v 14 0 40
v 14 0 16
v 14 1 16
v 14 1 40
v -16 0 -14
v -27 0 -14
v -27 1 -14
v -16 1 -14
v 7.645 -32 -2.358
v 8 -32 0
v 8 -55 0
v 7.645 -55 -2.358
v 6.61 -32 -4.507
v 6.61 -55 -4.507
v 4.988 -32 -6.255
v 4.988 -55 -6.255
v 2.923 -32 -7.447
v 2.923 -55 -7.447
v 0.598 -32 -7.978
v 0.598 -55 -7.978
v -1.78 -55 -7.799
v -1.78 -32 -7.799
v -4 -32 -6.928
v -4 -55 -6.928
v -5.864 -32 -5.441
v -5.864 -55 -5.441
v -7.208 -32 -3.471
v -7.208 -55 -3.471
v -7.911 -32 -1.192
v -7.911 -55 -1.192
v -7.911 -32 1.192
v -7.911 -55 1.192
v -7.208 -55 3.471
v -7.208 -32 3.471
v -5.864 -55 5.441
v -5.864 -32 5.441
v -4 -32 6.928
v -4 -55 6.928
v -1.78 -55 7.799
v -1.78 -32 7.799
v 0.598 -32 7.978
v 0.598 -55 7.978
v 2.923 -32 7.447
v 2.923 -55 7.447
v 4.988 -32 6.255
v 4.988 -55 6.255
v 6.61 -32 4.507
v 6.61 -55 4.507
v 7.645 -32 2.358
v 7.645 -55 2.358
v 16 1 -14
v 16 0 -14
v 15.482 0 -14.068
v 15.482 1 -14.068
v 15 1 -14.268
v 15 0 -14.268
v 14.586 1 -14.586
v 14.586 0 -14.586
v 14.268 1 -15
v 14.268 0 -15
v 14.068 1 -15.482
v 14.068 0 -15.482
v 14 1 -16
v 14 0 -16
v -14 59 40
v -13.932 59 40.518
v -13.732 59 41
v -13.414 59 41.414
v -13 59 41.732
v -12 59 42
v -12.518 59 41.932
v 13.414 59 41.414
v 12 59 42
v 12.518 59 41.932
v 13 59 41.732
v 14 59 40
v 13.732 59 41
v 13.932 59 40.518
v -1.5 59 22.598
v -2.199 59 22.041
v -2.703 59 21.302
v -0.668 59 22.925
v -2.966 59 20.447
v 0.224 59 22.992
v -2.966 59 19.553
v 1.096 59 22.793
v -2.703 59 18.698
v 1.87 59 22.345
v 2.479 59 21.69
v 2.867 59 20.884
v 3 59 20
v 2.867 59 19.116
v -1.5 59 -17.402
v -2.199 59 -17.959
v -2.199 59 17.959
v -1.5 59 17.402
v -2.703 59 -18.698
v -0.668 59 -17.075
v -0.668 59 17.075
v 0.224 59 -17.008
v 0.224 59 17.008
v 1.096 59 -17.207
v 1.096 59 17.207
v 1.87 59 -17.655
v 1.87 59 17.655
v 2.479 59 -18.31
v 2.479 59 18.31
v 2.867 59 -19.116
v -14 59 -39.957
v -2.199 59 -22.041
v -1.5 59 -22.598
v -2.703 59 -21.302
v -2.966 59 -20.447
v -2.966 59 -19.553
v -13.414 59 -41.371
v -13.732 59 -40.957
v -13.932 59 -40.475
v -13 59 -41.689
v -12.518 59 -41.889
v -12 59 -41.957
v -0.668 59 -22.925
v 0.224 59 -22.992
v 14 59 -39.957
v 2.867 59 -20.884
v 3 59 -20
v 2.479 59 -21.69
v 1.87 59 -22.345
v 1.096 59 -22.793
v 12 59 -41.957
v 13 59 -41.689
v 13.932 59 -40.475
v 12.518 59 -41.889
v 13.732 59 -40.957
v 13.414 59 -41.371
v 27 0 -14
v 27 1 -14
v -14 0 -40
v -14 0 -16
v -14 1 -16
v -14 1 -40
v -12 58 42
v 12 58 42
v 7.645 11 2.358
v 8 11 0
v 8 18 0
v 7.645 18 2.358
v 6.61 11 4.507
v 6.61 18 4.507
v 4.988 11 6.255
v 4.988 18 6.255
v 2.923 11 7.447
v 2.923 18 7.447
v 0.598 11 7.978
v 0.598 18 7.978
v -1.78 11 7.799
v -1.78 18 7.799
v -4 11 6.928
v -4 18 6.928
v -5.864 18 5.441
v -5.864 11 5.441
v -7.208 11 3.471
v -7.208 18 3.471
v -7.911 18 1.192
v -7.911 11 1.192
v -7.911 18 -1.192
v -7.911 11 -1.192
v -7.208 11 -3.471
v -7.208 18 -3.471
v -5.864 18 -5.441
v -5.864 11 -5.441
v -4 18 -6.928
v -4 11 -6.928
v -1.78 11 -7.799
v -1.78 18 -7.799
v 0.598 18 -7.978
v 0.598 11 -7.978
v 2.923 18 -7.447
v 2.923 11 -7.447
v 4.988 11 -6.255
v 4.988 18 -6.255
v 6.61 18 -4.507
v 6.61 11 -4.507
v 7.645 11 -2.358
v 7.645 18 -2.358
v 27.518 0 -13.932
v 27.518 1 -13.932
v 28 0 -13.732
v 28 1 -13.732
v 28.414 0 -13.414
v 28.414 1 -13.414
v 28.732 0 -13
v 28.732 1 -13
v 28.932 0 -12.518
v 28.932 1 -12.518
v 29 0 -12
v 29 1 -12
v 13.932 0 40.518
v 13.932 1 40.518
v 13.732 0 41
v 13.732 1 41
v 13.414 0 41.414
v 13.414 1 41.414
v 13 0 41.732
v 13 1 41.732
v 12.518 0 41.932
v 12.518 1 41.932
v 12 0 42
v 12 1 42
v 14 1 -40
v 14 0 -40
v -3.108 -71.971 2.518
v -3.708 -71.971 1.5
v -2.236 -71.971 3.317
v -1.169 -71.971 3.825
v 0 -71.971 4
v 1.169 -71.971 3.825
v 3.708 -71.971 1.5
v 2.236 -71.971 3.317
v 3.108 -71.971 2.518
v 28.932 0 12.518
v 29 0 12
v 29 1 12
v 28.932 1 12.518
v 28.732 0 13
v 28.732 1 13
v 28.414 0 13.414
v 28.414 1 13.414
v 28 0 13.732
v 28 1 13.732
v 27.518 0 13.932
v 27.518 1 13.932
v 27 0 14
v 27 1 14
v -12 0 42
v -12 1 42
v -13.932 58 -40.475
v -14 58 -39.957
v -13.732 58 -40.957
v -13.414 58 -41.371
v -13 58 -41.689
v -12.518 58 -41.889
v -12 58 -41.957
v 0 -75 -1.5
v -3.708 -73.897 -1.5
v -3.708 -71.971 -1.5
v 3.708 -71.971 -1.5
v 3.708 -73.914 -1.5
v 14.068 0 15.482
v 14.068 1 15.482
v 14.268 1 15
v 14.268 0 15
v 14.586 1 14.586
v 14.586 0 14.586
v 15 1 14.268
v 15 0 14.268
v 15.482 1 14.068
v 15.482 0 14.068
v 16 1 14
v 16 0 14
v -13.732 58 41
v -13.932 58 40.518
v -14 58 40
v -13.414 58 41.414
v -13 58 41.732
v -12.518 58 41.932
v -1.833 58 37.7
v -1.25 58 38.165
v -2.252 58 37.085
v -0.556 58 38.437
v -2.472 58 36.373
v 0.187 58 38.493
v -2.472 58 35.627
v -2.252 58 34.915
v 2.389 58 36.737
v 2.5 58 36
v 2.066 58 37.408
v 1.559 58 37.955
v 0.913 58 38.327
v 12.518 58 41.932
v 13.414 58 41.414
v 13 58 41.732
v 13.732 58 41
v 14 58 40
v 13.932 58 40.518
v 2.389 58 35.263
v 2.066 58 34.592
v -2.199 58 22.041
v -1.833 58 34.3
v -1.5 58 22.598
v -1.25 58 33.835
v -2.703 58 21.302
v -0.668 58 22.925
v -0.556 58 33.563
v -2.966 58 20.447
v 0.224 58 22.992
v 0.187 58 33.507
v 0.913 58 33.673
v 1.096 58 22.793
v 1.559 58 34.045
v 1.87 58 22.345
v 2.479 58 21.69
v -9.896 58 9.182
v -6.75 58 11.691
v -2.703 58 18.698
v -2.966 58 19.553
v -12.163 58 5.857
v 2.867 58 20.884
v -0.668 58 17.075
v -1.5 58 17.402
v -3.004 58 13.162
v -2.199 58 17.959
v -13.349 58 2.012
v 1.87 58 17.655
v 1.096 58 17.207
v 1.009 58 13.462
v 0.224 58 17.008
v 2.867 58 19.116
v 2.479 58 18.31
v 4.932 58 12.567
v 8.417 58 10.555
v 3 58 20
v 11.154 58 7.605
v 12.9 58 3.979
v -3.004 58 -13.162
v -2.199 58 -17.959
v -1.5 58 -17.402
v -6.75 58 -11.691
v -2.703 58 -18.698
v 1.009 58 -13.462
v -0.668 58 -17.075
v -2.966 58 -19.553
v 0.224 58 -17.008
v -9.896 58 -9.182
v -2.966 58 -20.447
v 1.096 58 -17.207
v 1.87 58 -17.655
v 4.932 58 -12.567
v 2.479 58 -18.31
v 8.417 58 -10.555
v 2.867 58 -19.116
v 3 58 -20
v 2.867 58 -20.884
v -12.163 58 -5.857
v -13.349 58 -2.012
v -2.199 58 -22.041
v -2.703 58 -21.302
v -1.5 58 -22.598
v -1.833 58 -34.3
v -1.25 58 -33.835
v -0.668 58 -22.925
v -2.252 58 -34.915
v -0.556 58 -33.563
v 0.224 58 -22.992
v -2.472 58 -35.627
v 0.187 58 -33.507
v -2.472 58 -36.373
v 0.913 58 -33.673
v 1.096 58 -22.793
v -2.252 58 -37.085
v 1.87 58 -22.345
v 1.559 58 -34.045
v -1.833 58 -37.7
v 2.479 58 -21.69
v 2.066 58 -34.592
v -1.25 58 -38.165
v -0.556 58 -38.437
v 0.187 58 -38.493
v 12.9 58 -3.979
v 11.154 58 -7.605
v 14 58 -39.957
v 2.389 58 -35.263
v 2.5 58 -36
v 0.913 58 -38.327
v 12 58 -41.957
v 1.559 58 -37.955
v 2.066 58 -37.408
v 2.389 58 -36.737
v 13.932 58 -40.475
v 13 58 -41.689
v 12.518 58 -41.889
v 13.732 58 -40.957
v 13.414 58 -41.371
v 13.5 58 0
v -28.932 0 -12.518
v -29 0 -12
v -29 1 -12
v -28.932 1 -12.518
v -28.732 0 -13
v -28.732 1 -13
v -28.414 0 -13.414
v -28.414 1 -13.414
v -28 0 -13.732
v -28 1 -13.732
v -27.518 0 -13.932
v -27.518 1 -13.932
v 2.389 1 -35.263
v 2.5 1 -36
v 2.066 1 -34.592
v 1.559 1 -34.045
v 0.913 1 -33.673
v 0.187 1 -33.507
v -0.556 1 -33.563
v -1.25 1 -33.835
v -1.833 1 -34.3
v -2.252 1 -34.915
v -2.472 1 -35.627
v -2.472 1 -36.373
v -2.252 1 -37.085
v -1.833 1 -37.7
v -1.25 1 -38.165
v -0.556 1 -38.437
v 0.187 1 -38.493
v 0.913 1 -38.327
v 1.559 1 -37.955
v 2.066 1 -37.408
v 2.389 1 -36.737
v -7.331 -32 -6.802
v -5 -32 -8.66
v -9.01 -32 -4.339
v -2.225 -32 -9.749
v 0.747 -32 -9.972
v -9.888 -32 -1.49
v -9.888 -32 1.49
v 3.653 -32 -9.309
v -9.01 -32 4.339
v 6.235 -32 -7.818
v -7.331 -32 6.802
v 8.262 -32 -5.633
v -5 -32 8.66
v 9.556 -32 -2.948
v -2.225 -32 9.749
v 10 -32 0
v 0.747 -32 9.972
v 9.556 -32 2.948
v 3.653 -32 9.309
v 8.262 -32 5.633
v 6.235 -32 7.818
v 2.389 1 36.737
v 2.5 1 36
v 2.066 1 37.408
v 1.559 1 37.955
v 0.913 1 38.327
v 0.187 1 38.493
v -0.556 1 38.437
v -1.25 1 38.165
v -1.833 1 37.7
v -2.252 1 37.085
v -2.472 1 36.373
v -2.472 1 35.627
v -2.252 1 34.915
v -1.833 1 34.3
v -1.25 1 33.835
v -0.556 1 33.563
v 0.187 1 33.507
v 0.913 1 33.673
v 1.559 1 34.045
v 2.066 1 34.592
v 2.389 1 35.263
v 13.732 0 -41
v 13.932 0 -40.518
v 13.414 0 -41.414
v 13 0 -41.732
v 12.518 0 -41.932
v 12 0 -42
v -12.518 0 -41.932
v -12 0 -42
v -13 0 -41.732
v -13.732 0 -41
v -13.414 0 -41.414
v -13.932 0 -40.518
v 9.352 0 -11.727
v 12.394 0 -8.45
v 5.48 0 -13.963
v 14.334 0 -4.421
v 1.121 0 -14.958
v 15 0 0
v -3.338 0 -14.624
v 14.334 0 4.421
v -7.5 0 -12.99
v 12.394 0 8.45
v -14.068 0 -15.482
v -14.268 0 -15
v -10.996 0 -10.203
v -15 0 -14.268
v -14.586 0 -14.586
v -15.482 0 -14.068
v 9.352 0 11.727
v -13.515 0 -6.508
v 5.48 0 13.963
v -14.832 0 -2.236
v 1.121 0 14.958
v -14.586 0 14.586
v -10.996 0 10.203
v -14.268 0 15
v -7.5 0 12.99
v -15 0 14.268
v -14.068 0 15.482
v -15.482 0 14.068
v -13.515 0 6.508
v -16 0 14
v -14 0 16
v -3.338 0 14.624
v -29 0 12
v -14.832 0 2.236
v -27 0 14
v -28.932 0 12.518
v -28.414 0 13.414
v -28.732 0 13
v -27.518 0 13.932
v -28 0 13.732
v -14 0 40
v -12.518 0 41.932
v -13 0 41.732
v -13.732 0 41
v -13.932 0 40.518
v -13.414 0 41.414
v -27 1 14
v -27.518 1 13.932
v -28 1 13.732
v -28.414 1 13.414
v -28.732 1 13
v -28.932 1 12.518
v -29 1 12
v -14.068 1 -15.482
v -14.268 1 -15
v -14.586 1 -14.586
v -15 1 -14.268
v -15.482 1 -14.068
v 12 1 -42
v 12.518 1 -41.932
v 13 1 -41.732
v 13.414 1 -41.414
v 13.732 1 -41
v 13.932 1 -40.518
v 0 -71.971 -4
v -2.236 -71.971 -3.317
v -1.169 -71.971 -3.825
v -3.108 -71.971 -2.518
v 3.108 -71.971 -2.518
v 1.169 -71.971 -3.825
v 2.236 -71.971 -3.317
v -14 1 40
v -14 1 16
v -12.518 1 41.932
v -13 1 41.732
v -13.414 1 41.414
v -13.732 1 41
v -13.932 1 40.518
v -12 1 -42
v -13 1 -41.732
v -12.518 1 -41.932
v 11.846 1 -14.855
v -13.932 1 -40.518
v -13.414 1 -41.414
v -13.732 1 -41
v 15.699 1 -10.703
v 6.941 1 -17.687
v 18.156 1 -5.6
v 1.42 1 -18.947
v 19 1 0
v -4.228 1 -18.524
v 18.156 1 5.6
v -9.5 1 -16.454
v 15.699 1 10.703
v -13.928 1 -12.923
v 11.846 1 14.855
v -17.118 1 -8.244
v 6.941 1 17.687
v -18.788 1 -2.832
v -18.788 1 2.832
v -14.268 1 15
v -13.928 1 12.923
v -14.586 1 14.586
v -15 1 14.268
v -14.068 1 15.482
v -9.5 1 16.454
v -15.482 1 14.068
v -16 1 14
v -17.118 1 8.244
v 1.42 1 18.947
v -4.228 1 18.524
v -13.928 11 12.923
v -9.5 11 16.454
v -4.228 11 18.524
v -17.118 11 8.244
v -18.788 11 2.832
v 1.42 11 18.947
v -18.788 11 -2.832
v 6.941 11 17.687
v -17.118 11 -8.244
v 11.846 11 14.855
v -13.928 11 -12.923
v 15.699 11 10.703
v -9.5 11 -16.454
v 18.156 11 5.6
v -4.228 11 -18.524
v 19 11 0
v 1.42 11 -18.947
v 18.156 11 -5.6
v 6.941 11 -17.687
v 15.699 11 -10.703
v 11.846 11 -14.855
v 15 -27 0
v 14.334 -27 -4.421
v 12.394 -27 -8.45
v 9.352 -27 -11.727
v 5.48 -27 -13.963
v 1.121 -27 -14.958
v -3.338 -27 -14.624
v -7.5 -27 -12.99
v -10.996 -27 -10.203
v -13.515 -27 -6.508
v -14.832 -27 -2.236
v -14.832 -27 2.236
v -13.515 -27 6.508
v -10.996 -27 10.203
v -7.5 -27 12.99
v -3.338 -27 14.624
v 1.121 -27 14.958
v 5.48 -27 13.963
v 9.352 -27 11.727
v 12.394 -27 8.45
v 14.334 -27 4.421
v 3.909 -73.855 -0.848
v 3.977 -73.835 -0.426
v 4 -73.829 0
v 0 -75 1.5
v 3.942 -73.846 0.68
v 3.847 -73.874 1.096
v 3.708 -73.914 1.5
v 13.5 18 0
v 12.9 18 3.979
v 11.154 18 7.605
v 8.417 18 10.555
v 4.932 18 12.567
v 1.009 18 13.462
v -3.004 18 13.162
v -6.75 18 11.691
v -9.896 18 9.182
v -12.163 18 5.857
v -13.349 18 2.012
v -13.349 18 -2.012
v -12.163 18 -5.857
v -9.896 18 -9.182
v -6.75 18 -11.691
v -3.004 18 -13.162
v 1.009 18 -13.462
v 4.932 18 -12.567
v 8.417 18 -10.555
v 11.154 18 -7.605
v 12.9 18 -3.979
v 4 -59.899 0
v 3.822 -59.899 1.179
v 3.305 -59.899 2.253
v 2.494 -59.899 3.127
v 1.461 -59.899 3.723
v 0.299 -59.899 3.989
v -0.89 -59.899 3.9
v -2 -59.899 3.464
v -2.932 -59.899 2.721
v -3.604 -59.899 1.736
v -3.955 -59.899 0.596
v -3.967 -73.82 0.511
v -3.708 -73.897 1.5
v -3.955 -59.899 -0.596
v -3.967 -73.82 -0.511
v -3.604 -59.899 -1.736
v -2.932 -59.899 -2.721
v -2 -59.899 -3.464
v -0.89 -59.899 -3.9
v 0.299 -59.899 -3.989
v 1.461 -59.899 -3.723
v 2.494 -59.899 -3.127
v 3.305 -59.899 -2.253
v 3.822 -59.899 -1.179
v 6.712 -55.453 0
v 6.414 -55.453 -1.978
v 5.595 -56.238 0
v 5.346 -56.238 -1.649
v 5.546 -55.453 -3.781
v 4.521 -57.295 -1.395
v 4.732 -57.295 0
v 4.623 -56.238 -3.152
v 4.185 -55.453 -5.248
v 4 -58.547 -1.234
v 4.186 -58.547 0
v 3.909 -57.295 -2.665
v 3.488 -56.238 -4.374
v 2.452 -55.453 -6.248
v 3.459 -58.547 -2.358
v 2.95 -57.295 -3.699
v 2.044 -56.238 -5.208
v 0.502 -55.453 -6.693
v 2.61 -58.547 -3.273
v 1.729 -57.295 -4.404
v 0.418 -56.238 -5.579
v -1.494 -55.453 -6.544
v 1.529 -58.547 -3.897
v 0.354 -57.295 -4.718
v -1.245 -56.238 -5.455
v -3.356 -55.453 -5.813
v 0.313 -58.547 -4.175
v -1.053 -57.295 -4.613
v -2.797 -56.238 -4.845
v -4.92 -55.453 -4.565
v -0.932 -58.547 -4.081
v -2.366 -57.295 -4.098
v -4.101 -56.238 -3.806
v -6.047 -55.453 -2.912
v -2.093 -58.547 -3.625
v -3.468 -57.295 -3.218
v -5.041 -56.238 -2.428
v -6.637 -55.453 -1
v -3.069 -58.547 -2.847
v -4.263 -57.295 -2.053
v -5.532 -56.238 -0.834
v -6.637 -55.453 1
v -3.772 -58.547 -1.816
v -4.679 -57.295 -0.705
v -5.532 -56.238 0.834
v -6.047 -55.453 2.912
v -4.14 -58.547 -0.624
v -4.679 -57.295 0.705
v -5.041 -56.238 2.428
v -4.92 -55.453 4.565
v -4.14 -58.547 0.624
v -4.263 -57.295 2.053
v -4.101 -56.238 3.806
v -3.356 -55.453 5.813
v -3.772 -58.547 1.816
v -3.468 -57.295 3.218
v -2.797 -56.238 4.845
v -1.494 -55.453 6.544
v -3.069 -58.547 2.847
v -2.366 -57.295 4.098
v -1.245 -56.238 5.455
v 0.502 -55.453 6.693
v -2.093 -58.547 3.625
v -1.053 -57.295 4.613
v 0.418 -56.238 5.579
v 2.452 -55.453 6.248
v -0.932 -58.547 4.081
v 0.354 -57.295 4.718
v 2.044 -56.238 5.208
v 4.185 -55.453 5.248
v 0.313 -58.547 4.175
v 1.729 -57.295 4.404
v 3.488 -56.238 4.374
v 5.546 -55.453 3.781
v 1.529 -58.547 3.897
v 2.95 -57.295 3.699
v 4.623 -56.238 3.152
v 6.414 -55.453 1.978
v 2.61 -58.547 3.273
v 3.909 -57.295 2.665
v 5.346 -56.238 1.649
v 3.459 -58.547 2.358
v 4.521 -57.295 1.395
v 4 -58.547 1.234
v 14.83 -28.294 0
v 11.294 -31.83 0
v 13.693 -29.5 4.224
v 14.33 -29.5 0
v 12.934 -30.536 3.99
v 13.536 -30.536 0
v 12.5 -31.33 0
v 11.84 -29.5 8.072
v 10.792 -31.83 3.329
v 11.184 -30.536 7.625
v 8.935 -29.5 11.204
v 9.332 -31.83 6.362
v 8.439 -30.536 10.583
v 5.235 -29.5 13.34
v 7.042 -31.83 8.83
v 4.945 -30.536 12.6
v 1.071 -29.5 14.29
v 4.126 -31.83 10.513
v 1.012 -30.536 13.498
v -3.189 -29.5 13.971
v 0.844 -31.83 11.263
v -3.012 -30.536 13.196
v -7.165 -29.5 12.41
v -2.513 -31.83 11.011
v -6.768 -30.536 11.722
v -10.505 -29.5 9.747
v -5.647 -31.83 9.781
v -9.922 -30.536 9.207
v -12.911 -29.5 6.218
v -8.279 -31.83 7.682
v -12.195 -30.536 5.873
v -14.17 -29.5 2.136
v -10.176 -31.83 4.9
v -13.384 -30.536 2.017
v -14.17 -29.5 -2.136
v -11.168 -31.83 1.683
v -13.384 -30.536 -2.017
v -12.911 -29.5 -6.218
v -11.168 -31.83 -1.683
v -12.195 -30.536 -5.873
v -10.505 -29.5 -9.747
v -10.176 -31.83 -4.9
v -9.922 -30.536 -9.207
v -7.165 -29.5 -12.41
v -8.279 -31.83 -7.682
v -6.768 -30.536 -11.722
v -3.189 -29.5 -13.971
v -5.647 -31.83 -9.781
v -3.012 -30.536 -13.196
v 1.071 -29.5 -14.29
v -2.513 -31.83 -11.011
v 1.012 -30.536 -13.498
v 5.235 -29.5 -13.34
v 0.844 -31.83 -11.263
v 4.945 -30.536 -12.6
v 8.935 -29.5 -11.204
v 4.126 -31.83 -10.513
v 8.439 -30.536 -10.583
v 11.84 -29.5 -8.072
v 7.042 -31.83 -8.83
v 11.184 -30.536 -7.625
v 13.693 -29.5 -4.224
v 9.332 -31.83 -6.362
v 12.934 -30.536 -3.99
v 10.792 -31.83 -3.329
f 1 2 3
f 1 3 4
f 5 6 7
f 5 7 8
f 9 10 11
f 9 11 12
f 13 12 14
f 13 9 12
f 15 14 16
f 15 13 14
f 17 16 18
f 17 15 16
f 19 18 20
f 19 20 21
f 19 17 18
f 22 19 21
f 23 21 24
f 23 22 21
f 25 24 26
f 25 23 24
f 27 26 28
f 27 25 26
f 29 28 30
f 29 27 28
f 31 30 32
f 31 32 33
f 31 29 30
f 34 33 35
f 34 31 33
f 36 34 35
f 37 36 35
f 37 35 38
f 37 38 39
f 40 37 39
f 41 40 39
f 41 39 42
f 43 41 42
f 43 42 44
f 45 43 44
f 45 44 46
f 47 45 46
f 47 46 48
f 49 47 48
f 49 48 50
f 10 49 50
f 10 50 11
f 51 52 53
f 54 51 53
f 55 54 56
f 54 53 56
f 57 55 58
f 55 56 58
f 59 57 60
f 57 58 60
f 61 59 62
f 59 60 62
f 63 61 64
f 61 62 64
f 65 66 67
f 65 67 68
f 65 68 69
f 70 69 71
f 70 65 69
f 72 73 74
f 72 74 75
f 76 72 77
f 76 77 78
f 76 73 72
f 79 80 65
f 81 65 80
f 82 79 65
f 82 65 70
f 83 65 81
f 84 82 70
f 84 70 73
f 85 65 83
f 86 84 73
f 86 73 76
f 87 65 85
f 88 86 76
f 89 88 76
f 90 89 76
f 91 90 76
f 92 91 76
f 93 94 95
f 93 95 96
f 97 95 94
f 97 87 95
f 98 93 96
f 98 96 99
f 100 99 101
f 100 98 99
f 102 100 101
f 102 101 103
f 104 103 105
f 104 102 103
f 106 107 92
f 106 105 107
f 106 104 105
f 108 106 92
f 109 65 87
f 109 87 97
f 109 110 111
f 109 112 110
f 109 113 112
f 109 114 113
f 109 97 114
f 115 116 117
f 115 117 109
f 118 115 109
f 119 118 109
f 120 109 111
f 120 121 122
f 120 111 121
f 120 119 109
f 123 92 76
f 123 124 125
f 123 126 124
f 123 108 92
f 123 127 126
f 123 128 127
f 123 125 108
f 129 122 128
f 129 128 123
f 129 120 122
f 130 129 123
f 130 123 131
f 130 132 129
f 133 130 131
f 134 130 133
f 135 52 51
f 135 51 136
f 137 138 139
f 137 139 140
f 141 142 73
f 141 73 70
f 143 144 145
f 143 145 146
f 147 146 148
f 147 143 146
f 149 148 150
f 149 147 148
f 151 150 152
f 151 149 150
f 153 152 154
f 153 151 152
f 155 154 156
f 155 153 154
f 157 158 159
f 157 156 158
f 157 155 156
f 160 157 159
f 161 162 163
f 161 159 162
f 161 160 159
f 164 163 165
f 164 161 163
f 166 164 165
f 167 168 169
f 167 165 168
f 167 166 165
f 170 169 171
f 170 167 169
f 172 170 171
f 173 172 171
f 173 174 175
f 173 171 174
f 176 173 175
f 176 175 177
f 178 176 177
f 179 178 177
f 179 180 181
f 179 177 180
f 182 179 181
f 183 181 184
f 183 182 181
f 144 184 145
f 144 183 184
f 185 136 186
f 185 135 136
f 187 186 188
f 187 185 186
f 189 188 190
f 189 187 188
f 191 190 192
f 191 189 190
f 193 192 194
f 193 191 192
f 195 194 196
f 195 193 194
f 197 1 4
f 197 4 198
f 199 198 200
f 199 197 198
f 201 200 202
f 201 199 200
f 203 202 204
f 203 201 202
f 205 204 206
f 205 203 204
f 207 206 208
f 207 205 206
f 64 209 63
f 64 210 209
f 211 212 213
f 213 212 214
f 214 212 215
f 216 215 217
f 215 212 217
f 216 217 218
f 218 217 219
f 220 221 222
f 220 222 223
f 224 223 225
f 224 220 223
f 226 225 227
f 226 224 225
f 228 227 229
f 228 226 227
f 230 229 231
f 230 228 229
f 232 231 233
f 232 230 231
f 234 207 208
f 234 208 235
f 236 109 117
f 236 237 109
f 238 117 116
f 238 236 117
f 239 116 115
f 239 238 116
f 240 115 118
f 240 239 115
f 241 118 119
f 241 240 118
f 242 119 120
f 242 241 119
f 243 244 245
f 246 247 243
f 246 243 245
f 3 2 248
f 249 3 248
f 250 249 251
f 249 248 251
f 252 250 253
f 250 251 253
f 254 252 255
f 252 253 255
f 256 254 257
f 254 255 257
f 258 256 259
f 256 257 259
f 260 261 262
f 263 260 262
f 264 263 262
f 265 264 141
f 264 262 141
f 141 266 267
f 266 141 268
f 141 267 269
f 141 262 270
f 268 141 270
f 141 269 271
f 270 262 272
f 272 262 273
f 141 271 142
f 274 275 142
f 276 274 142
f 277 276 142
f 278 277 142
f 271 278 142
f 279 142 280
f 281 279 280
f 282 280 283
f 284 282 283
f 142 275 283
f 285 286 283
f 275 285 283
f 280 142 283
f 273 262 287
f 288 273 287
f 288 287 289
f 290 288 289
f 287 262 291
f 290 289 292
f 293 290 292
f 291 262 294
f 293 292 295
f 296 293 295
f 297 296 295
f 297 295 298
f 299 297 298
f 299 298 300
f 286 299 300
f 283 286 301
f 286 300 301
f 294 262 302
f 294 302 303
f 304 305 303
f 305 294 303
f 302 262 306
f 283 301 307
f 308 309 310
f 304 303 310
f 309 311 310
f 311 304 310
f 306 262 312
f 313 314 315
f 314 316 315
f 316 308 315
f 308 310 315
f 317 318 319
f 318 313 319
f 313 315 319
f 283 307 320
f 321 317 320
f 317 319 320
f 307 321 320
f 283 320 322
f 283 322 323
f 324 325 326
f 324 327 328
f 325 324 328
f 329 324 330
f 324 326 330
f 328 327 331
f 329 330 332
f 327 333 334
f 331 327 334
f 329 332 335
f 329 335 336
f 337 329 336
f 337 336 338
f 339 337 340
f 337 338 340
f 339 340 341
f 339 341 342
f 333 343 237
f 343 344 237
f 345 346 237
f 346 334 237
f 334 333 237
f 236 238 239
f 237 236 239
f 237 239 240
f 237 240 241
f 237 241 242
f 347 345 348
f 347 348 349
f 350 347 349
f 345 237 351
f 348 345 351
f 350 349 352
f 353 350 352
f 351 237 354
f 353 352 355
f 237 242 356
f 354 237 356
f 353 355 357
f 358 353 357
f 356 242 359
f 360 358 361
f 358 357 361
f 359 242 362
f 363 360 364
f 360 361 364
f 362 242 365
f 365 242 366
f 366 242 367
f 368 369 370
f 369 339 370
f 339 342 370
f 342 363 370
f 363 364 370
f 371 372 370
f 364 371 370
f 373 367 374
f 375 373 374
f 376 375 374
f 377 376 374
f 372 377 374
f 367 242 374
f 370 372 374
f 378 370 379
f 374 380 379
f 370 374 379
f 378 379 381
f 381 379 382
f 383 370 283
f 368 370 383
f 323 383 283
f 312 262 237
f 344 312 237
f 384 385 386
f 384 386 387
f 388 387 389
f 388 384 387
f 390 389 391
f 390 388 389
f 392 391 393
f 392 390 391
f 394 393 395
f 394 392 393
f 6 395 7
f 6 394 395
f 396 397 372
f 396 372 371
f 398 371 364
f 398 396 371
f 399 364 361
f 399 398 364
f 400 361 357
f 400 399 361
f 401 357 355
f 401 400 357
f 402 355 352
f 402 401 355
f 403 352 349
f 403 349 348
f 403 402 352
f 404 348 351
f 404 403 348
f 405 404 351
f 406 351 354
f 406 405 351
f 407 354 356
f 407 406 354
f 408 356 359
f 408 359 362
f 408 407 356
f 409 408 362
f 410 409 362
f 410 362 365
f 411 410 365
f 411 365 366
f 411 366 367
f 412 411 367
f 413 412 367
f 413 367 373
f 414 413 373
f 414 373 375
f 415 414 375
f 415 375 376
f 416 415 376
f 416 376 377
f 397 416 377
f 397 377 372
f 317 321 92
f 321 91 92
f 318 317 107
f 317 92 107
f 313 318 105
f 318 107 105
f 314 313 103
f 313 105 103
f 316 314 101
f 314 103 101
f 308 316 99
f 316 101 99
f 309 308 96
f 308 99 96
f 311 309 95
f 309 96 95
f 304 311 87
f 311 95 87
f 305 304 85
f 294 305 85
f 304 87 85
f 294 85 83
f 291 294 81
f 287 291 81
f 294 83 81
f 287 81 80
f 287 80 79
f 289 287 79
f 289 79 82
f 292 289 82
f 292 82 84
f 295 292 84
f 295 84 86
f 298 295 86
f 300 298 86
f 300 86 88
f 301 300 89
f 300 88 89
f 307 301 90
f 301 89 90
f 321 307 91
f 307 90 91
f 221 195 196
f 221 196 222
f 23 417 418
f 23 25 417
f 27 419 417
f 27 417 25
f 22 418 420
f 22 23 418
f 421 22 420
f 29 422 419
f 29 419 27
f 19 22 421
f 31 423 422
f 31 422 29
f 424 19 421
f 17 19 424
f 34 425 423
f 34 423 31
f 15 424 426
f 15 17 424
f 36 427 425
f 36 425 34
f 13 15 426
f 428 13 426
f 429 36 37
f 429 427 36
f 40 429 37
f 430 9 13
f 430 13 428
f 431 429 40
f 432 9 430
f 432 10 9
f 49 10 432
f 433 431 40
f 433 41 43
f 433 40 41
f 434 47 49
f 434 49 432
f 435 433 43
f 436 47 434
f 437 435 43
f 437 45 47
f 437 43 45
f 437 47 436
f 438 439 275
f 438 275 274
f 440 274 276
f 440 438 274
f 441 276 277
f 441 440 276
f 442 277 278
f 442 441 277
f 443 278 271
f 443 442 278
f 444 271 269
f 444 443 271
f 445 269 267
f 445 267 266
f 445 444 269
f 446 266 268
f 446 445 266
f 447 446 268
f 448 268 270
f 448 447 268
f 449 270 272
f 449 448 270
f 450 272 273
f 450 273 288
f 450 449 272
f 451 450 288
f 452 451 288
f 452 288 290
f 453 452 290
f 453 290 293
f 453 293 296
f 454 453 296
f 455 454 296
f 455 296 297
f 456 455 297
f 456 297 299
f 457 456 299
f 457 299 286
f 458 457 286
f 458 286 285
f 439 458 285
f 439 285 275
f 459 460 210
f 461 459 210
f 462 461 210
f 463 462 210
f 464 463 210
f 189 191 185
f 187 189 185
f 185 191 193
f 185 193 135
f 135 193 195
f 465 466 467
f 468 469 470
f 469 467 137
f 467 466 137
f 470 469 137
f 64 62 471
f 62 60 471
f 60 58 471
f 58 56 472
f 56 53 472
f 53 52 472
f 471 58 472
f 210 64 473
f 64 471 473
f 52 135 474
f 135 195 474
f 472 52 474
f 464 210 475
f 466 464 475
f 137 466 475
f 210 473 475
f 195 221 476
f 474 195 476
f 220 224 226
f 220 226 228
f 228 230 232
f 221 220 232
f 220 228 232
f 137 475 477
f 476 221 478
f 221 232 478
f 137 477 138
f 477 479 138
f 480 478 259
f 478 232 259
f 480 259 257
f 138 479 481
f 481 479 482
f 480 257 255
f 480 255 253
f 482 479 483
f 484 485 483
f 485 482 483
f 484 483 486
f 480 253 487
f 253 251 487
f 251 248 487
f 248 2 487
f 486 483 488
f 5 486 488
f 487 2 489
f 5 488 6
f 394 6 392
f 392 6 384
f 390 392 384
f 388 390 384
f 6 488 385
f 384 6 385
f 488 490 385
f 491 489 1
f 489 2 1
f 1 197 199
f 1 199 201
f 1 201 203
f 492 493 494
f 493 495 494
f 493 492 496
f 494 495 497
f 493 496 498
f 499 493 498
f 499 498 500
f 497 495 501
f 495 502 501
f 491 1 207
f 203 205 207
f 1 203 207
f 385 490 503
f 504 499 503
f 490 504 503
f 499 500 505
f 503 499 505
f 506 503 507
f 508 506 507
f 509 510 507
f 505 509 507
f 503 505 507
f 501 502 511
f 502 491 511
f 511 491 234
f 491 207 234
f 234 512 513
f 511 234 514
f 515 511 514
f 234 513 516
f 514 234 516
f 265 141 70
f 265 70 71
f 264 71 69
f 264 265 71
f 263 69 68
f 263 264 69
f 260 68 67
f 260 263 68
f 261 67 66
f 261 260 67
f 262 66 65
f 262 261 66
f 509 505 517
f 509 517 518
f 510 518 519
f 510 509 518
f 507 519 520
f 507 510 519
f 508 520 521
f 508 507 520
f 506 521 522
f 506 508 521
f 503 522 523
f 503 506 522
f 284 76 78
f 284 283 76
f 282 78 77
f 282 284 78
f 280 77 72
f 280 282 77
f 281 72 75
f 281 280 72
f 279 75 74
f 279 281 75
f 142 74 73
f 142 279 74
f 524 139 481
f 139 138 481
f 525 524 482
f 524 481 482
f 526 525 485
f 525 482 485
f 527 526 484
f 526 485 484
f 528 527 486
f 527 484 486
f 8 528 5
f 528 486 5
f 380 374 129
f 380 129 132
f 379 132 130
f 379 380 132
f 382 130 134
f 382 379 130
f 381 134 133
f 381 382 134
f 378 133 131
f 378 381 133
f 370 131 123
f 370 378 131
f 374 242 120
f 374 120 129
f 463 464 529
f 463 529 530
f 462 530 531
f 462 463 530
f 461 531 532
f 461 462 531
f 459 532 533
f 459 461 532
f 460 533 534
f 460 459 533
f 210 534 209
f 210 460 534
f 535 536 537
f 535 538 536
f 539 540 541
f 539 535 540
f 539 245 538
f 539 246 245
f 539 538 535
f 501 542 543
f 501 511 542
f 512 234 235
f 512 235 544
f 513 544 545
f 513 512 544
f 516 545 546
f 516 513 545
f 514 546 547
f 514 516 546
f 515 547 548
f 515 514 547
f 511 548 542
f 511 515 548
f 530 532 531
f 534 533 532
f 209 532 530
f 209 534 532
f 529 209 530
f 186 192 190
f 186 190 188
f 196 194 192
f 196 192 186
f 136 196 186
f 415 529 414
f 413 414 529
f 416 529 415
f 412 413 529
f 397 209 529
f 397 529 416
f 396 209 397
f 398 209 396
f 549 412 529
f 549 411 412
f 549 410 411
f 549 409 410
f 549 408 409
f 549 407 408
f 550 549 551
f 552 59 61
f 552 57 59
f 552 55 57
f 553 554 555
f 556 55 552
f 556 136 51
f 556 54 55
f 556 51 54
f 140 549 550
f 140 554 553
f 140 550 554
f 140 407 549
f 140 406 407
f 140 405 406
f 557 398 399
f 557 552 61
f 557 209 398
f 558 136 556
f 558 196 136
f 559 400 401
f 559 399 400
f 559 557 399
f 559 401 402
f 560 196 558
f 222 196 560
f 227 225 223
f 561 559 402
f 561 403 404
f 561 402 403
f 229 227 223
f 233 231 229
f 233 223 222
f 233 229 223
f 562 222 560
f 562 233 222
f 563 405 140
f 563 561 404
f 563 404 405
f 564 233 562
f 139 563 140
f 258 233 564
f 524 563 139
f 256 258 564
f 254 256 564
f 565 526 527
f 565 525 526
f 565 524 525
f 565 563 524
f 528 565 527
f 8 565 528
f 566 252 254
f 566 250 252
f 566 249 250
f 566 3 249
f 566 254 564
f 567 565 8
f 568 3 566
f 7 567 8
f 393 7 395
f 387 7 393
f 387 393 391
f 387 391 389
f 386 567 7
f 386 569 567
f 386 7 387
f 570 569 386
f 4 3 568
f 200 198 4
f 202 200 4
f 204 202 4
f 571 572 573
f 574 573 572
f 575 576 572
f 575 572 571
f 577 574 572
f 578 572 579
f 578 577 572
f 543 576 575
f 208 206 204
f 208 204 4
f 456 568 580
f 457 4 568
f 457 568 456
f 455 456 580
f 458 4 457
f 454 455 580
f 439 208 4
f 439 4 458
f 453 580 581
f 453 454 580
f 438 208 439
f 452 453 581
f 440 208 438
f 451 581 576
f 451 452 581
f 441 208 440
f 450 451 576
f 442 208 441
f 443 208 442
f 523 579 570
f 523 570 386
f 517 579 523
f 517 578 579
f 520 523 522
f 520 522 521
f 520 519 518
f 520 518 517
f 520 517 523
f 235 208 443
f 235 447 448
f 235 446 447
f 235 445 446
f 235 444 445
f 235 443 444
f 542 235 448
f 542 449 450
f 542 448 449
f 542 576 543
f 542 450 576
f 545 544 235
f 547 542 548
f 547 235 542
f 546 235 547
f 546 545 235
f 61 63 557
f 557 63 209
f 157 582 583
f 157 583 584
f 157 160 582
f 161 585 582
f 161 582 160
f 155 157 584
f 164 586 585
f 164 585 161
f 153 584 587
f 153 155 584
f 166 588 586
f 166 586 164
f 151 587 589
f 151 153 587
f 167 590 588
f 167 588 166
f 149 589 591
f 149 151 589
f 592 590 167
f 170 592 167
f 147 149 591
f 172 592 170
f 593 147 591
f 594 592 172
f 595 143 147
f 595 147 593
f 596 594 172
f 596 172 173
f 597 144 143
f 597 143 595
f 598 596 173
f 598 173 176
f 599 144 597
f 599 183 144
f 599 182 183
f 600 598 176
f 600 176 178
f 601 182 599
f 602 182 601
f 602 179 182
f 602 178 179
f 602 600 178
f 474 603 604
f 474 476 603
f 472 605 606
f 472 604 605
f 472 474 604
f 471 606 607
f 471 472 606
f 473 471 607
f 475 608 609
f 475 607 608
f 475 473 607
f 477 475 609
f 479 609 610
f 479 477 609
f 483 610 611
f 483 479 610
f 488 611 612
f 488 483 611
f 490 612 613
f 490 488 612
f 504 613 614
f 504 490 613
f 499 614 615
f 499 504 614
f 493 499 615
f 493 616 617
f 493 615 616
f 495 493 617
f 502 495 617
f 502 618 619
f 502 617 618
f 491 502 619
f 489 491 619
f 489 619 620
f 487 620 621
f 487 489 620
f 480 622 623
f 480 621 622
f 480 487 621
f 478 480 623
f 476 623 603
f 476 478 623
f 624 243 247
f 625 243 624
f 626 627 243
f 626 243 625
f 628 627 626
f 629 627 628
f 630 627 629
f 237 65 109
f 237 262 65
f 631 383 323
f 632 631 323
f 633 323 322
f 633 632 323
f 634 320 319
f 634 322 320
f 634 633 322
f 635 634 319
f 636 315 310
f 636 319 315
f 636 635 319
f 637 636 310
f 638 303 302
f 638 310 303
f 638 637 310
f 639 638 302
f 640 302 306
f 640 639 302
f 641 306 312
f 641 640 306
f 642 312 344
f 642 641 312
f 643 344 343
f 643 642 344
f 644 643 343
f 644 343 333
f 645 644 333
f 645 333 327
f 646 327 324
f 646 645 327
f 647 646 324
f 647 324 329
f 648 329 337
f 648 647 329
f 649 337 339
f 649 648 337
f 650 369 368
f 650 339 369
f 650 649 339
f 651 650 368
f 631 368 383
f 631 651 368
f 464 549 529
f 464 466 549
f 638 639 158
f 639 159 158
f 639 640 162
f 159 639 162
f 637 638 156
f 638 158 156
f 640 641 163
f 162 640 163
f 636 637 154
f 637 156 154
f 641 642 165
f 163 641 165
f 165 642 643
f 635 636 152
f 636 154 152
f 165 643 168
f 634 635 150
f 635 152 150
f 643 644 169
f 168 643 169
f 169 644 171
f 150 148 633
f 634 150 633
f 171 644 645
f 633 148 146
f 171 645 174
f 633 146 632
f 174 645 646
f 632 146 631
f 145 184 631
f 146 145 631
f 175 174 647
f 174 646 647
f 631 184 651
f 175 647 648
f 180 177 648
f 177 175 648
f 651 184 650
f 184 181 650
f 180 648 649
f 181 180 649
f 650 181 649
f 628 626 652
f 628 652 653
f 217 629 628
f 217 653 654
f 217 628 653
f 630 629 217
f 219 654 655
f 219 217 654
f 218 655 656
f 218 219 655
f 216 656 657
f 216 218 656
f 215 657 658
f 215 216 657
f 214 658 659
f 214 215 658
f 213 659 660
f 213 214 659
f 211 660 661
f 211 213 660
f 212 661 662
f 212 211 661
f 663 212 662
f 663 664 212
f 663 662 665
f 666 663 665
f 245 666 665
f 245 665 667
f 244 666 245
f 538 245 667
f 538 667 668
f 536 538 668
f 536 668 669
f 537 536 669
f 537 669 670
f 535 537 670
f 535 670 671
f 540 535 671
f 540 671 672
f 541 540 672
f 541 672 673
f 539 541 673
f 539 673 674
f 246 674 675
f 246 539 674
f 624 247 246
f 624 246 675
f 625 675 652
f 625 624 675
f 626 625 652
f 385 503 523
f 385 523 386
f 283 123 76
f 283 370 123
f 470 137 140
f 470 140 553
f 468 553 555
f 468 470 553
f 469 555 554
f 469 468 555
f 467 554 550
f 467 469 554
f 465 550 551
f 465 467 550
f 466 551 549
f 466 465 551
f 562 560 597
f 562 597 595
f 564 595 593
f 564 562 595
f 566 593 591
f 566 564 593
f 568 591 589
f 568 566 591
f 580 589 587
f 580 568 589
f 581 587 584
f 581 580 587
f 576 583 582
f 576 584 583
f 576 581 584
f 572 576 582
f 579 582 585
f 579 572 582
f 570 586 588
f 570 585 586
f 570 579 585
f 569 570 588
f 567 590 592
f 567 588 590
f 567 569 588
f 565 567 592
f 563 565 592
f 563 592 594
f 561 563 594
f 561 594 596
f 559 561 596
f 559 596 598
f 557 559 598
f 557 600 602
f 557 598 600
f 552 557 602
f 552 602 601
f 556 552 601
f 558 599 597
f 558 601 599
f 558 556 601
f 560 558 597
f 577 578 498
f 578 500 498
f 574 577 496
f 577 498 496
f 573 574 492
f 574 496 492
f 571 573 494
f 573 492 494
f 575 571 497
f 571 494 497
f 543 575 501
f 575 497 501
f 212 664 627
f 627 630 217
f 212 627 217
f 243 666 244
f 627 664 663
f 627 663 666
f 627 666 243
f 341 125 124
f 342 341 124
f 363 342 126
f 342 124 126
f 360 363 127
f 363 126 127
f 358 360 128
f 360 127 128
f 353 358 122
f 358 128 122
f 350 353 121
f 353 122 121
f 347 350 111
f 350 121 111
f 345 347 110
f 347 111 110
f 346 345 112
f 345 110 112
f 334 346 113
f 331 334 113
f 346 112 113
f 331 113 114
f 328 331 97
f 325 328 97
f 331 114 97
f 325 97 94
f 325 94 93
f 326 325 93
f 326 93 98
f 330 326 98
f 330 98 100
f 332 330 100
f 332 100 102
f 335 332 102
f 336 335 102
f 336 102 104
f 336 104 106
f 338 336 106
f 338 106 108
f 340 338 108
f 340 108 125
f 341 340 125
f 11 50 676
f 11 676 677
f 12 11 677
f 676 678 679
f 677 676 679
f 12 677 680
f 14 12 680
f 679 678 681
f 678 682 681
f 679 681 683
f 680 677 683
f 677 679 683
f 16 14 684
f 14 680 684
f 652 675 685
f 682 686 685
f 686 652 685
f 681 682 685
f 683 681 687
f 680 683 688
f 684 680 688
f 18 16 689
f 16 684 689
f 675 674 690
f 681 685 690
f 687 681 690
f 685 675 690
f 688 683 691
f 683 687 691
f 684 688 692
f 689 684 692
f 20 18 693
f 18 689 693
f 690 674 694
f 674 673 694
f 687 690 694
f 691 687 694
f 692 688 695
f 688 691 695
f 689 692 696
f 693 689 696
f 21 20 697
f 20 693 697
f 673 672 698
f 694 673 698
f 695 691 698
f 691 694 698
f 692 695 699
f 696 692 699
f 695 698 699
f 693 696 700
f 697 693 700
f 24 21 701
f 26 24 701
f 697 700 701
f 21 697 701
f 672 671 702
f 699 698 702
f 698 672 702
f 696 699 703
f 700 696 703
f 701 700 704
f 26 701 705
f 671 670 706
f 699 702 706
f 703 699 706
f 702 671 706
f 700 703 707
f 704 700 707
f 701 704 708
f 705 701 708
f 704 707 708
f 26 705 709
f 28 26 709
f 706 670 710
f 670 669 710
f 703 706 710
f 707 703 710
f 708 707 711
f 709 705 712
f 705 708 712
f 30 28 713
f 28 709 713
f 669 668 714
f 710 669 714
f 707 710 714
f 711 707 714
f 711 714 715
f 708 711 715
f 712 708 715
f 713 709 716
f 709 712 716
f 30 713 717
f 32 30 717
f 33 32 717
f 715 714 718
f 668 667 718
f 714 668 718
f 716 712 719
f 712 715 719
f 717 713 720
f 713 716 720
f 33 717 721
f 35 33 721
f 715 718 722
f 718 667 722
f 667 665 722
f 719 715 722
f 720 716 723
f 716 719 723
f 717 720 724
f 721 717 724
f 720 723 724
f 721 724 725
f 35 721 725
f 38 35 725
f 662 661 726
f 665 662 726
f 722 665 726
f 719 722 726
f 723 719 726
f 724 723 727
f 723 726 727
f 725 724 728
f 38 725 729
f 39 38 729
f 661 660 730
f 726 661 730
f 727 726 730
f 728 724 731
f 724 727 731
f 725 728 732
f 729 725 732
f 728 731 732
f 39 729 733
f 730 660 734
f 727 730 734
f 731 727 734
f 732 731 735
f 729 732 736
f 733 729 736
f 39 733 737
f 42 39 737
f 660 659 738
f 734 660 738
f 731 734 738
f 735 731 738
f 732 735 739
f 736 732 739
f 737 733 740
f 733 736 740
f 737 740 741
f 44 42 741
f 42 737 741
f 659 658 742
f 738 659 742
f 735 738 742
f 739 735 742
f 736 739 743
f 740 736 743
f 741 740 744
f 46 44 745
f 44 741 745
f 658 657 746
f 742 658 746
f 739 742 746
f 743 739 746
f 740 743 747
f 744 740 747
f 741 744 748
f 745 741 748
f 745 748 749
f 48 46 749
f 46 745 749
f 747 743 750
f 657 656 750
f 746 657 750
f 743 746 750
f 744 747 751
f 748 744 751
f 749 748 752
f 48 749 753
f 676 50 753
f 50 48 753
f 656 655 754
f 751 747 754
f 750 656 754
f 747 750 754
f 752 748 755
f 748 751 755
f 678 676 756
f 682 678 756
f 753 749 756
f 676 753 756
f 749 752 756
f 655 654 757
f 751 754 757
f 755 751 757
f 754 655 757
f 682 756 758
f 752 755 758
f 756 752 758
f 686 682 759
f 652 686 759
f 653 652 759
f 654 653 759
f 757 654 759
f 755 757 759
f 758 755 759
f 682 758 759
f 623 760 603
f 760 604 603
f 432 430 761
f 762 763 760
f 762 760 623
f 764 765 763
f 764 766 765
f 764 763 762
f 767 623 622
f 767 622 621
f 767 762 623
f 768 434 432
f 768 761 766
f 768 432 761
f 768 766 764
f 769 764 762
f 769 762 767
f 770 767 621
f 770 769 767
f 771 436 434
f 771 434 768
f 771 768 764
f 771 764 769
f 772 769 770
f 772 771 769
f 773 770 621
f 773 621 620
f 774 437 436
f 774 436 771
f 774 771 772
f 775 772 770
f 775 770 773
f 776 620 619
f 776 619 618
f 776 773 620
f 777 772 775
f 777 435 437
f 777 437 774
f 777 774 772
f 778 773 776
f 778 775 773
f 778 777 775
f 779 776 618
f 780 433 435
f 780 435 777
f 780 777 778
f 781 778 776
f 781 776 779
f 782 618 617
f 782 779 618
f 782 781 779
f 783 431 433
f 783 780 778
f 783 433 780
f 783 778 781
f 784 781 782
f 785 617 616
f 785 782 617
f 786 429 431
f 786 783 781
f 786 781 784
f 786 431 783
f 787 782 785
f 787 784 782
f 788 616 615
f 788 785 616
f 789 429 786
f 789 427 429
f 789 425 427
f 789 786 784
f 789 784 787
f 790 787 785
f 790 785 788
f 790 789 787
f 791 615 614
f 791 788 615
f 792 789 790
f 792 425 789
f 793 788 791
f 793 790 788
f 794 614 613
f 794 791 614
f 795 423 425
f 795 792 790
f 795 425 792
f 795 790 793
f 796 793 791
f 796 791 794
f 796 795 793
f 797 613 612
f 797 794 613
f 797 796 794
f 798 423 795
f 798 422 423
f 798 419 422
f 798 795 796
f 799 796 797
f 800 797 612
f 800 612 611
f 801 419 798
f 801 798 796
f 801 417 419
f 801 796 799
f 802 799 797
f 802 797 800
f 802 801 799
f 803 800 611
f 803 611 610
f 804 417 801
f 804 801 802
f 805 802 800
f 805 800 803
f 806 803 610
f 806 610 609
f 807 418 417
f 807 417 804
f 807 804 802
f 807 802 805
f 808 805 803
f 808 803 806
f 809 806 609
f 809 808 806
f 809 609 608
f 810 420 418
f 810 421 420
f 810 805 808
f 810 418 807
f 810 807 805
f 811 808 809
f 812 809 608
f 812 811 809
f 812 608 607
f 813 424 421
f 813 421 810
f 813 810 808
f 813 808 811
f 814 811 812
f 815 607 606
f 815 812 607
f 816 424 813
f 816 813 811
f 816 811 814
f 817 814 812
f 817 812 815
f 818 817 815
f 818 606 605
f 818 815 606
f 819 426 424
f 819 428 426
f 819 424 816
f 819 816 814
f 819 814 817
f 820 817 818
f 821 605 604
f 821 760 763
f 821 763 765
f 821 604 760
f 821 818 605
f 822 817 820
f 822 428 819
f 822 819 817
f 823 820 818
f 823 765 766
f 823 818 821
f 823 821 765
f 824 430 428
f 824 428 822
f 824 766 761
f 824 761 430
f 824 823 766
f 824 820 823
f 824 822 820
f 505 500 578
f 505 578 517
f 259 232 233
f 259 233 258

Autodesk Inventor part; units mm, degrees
ref_plane "YZ Plane" through (0, 0, 0) normal (1, 0, 0) x (0, 1, 0)
ref_plane "XZ Plane" through (0, 0, 0) normal (0, 1, 0) x (-1, 0, 0)
ref_plane "XY Plane" through (0, 0, 0) normal (0, 0, 1) x (1, 0, 0)
sketch "Sketch1" plane through (0, 0, 0) normal (0, 1, 0) x (-1, 0, 0)
  line L0 (29, 0) -> (29, -12)
  line L1 (27, -14) -> (16, -14)
  line L2 (-16, -14) -> (-27, -14)
  line L3 (-29, -12) -> (-29, 12)
  line L4 (-27, 14) -> (-16, 14)
  line L5 (16, 14) -> (27, 14)
  line L6 (29, 12) -> (29, 0)
  line L7 (14, -16) -> (14, -40)
  line L8 (12, -42) -> (-12, -42)
  line L9 (-14, -40) -> (-14, -16)
  line L10 (-14, 16) -> (-14, 40)
  line L11 (-12, 42) -> (12, 42)
  line L12 (14, 40) -> (14, 16)
  arc A0 (29, 12) -> (27, 14) centre (27, 12) ccw
  arc A1 (27, -14) -> (29, -12) centre (27, -12) ccw
  arc A2 (16, -14) -> (14, -16) centre (16, -16) ccw
  arc A3 (12, -42) -> (14, -40) centre (12, -40) ccw
  arc A4 (-14, -40) -> (-12, -42) centre (-12, -40) ccw
  arc A5 (-14, -16) -> (-16, -14) centre (-16, -16) ccw
  arc A6 (-29, -12) -> (-27, -14) centre (-27, -12) ccw
  arc A7 (-27, 14) -> (-29, 12) centre (-27, 12) ccw
  arc A8 (-16, 14) -> (-14, 16) centre (-16, 16) ccw
  arc A9 (-12, 42) -> (-14, 40) centre (-12, 40) ccw
  arc A10 (14, 40) -> (12, 42) centre (12, 40) ccw
  arc A11 (14, 16) -> (16, 14) centre (16, 16) ccw
  point P0 (0, 0)
  point P1 (29, -14)
  point P2 (14, -14)
  point P3 (-14, -14)
  point P4 (-29, -14)
  point P5 (-29, 14)
  point P6 (-14, 14)
  point P7 (14, -42)
  point P8 (-14, 42)
  point P9 (14, 42)
  dimension "d2" = 14
  dimension "d4" = 15
  dimension "d5" = 28
  dimension "d7" = 28
  dimension "d8" = 28
  dimension "d12" = 2
extrude "Extrusion1" add sketch "Sketch1" along normal blind 1
sketch "Sketch2" plane through (0, 1, 0) normal (0, 1, 0) x (1, 0, 0)
  circle A0 centre (0, 0) radius 19
  dimension "d15" = 38
extrude "Extrusion2" add sketch "Sketch2" along normal blind 10
sketch "Sketch3" plane through (0, 11, 0) normal (0, 1, 0) x (1, 0, 0)
  circle A0 centre (0, 0) radius 8
  dimension "d18" = 16
extrude "Extrusion3" add sketch "Sketch3" along normal blind 7
sketch "Sketch4" plane through (0, 18, 0) normal (0, 1, 0) x (1, 0, 0)
  circle A0 centre (0, 0) radius 13.5
  dimension "d21" = 27
extrude "Extrusion4" add sketch "Sketch4" along normal blind 40
sketch "Sketch5" plane through (0, 58, 0) normal (0, 1, 0) x (1, 0, 0)
  line L0 (0, 41.9572) -> (12, 41.9572)
  line L1 (14, 39.9572) -> (14, -40)
  line L2 (12, -42) -> (-12, -42)
  line L3 (-14, -40) -> (-14, 39.9572)
  line L4 (-12, 41.9572) -> (0, 41.9572)
  arc A0 (-12, 41.9572) -> (-14, 39.9572) centre (-12, 39.9572) ccw
  arc A1 (14, 39.9572) -> (12, 41.9572) centre (12, 39.9572) ccw
  arc A2 (12, -42) -> (14, -40) centre (12, -40) ccw
  arc A3 (-14, -40) -> (-12, -42) centre (-12, -40) ccw
  point P0 (0, 0)
  point P1 (-14, 41.9572)
  dimension "d24" = 2
extrude "Extrusion5" add sketch "Sketch5" along normal blind 1
sketch "Sketch6" plane through (0, 1, 0) normal (0, 1, 0) x (1, 0, 0)
  line L0 (0, 0) -> (0, 36)
  line L1 (0, 0) -> (0, -36)
  circle A0 centre (0, 36) radius 2.5
  circle A1 centre (0, -36) radius 2.5
  dimension "d27" = 36
  dimension "d28" = 36
  dimension "d29" = 5
  dimension "d30" = 5
extrude "Extrusion6" add sketch "Sketch6" along normal blind 58
sketch "Sketch7" plane through (0, 0, 0) normal (0, -1, 0) x (1, 0, 0)
  circle A0 centre (0, 0) radius 15
  dimension "d33" = 30
extrude "Extrusion7" add sketch "Sketch7" along normal blind 32
sketch "Sketch8" plane through (0, -32, 0) normal (0, -1, 0) x (1, 0, 0)
  circle A0 centre (0, 0) radius 8
  dimension "d36" = 16
extrude "Extrusion8" add sketch "Sketch8" along normal blind 43
fillet "Fillet1" radius 5 1 edges at (-15, -32, 0)
sketch "Sketch9" plane through (0, -75, 0) normal (0, -1, 0) x (1, 0, 0)
  circle A0 centre (0, 0) radius 4
  circle A1 centre (0, 0) radius 12.3979
  dimension "d40" = 8
extrude "Extrusion9" cut sketch "Sketch9" against normal blind 20
fillet "Fillet2" radius 5 1 edges at (-4, -55, 0)
sketch "Sketch10" plane through (14, 0, 40) normal (1, 0, 0) x (0, 0, -1)
  line L0 (36, -75) -> (44, -75) projected
  line L1 (36, -75) -> (38.5, -75)
  line L2 (38.5, -75) -> (38.5, -71.9713)
  line L3 (38.5, -71.9713) -> (36, -71.9713)
  line L4 (36, -71.9713) -> (36, -75)
  line L5 (44, -59.899) -> (44, -75) projected
  line L6 (44, -75) -> (41.5, -75)
  line L7 (41.5, -75) -> (41.5, -71.9713)
  line L8 (41.5, -71.9713) -> (44, -71.9713)
  line L9 (44, -71.9713) -> (44, -75)
  point P0 (40, 0)
  dimension "d44" = 2.5
  dimension "d45" = 2.5
extrude "Extrusion10" cut sketch "Sketch10" against normal blind 20
sketch "Sketch11" plane through (-3.7081, -71.9713, 1.5) normal (0, 0, 1) x (1, 0, 0)
  line L0 (7.4162, -3.0287) -> (0, -3.0287) projected
  line L1 (3.7081, -3.0287) -> (8.9248, -1.5011)
  line L2 (8.9248, -1.5011) -> (8.9248, -4.1511)
  line L3 (8.9248, -4.1511) -> (-1.9974, -3.8292)
  line L4 (-1.9974, -3.8292) -> (-1.4278, -1.5011)
  line L5 (-1.4278, -1.5011) -> (3.7081, -3.0287)
  point P0 (3.7081, 71.9713)
extrude "Extrusion11" cut sketch "Sketch11" against normal blind 20
sketch "Sketch12" plane through (0, 59, 0) normal (0, 1, 0) x (1, 0, 0)
  circle A0 centre (0, 20) radius 3
  circle A1 centre (0, -20) radius 3
  point P0 (0, 0)
  dimension "d51" = 6
  dimension "d52" = 6
extrude "Extrusion12" cut sketch "Sketch12" against normal blind 20
properties part number "marcadorNUEVO"
